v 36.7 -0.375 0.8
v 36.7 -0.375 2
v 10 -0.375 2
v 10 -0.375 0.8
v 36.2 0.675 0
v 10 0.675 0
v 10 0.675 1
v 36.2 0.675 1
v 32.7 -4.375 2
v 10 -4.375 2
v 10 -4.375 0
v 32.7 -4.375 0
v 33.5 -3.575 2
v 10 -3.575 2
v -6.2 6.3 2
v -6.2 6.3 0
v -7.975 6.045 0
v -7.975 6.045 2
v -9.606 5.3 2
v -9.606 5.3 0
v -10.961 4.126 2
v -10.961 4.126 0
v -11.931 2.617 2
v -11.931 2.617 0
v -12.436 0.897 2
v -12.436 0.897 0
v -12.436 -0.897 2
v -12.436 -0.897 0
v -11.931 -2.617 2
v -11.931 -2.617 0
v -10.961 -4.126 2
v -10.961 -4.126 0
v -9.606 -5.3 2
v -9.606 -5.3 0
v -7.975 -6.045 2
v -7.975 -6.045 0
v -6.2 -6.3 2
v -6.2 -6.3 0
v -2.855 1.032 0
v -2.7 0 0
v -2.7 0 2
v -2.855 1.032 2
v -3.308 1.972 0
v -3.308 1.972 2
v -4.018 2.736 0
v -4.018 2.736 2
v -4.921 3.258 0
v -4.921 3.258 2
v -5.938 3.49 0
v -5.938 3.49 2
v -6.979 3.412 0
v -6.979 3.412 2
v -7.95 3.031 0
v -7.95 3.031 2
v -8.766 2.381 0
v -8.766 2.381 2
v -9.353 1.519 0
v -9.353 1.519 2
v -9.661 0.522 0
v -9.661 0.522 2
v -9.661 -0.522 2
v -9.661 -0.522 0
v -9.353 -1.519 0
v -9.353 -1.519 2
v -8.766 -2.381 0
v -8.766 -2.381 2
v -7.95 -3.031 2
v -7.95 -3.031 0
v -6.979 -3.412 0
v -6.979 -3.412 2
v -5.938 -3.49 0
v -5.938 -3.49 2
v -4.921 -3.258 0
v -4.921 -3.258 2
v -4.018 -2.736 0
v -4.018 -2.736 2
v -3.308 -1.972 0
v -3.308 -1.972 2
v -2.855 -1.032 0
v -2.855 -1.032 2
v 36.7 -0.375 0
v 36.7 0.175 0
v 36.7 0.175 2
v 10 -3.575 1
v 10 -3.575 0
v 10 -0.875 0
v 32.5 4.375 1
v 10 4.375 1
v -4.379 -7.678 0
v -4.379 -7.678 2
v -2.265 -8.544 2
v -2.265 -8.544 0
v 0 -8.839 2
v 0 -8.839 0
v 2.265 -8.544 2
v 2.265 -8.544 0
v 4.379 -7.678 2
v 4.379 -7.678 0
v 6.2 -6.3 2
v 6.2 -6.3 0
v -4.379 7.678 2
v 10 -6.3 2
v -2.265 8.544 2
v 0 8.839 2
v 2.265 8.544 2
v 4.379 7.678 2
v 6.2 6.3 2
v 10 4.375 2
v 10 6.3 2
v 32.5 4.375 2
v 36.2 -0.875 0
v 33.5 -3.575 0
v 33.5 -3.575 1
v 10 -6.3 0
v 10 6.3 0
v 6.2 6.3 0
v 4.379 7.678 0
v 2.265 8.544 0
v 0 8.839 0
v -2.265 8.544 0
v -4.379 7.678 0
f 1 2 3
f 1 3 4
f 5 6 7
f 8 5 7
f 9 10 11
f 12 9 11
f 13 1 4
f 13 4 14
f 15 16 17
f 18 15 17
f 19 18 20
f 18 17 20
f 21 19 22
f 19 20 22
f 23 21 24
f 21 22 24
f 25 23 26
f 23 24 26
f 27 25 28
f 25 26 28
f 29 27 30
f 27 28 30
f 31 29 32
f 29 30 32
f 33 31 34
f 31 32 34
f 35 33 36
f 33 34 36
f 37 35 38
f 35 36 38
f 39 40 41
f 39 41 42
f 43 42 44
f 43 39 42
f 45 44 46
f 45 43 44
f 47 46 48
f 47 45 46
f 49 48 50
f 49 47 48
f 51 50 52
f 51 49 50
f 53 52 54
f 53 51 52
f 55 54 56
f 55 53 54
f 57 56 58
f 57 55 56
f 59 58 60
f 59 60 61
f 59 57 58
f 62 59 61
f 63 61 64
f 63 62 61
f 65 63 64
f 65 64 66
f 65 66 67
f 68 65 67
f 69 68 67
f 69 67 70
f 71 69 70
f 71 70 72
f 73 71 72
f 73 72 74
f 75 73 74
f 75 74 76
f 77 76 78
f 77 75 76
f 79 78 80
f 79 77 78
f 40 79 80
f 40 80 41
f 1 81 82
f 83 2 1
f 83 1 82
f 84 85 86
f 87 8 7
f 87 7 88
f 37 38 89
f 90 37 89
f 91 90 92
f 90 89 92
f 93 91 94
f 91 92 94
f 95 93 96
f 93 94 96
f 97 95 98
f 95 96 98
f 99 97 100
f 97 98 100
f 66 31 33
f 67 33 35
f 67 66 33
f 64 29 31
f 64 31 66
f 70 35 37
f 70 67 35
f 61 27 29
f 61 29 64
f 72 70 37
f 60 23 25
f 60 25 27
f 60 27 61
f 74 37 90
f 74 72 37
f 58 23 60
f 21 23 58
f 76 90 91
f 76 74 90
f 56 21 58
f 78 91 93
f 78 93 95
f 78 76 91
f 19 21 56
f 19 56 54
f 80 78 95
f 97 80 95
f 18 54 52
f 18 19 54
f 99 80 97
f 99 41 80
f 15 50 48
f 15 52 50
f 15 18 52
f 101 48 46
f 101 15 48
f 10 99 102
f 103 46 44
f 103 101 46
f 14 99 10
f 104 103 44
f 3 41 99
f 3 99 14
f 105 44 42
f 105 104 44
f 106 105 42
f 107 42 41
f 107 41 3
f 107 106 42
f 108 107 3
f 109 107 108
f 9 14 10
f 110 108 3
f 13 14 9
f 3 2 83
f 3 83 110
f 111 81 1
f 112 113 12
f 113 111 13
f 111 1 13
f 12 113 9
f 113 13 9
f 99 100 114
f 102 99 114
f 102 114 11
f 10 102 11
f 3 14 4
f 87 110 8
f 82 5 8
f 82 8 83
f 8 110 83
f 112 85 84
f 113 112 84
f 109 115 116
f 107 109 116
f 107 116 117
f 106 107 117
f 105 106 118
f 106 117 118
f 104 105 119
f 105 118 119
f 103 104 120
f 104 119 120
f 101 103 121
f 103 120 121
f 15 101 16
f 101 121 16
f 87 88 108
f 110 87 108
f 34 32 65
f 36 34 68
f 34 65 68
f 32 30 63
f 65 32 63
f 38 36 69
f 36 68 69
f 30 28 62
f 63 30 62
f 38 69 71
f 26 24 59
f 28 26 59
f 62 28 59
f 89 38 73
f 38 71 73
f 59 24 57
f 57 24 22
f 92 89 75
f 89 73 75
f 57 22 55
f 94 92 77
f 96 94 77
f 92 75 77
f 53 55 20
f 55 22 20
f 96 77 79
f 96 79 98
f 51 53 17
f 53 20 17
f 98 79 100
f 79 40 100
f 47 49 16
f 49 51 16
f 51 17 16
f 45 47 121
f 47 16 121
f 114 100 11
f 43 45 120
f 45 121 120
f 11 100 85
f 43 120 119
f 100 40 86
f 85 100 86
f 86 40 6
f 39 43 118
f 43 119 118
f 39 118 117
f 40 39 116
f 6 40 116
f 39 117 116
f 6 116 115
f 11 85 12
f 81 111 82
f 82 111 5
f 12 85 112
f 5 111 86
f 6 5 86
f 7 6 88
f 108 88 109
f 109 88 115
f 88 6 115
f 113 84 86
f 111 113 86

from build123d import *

# Parameters (mm, degrees)
F0_R     = 3.5
F1_DEPTH = 2
F3_DEPTH = 26.7
F5_DEPTH = 2.001


with BuildPart() as f1:
    # F0 (on Top) → F1 (new body)
    with BuildSketch(Plane.XY):
        with BuildLine():
            Line((6.2, -6.3), (10, -6.3))
            Line((10, -6.3), (10, 6.3))
            Line((10, 6.3), (6.2, 6.3))
            ThreePointArc((6.2, 6.3), (0, 8.839118), (-6.2, 6.3))
            ThreePointArc((-6.2, 6.3), (-12.5, 0), (-6.2, -6.3))
            ThreePointArc((-6.2, -6.3), (0, -8.839118), (6.2, -6.3))
        make_face()
        with Locations((-6.2, 0)):
            Circle(F0_R, mode=Mode.SUBTRACT)
    extrude(amount=F1_DEPTH)

    # F2 (on face) → F3 (join)
    with BuildSketch(Plane.YZ.offset(10)):
        Polygon((-0.875, 0), (0.675, 0), (0.675, 1), (4.375, 1), (4.375, 2), (-0.375, 2), (-0.375, 0.8), (-3.575, 2), (-4.375, 2), (-4.375, 0), (-3.575, 0), (-3.575, 1), align=None)
    extrude(amount=F3_DEPTH)

    # F4 (on face) → F5 (cut, through all)
    with BuildSketch(Plane.XY.offset(2)):
        Polygon((36.7, 0.175), (36.7, 4.375), (32.5, 4.375), align=None)
        Polygon((32.7, -4.375), (36.7, -4.375), (36.7, -0.375), align=None)
    extrude(amount=-F5_DEPTH, mode=Mode.SUBTRACT)


solid = f1.part
